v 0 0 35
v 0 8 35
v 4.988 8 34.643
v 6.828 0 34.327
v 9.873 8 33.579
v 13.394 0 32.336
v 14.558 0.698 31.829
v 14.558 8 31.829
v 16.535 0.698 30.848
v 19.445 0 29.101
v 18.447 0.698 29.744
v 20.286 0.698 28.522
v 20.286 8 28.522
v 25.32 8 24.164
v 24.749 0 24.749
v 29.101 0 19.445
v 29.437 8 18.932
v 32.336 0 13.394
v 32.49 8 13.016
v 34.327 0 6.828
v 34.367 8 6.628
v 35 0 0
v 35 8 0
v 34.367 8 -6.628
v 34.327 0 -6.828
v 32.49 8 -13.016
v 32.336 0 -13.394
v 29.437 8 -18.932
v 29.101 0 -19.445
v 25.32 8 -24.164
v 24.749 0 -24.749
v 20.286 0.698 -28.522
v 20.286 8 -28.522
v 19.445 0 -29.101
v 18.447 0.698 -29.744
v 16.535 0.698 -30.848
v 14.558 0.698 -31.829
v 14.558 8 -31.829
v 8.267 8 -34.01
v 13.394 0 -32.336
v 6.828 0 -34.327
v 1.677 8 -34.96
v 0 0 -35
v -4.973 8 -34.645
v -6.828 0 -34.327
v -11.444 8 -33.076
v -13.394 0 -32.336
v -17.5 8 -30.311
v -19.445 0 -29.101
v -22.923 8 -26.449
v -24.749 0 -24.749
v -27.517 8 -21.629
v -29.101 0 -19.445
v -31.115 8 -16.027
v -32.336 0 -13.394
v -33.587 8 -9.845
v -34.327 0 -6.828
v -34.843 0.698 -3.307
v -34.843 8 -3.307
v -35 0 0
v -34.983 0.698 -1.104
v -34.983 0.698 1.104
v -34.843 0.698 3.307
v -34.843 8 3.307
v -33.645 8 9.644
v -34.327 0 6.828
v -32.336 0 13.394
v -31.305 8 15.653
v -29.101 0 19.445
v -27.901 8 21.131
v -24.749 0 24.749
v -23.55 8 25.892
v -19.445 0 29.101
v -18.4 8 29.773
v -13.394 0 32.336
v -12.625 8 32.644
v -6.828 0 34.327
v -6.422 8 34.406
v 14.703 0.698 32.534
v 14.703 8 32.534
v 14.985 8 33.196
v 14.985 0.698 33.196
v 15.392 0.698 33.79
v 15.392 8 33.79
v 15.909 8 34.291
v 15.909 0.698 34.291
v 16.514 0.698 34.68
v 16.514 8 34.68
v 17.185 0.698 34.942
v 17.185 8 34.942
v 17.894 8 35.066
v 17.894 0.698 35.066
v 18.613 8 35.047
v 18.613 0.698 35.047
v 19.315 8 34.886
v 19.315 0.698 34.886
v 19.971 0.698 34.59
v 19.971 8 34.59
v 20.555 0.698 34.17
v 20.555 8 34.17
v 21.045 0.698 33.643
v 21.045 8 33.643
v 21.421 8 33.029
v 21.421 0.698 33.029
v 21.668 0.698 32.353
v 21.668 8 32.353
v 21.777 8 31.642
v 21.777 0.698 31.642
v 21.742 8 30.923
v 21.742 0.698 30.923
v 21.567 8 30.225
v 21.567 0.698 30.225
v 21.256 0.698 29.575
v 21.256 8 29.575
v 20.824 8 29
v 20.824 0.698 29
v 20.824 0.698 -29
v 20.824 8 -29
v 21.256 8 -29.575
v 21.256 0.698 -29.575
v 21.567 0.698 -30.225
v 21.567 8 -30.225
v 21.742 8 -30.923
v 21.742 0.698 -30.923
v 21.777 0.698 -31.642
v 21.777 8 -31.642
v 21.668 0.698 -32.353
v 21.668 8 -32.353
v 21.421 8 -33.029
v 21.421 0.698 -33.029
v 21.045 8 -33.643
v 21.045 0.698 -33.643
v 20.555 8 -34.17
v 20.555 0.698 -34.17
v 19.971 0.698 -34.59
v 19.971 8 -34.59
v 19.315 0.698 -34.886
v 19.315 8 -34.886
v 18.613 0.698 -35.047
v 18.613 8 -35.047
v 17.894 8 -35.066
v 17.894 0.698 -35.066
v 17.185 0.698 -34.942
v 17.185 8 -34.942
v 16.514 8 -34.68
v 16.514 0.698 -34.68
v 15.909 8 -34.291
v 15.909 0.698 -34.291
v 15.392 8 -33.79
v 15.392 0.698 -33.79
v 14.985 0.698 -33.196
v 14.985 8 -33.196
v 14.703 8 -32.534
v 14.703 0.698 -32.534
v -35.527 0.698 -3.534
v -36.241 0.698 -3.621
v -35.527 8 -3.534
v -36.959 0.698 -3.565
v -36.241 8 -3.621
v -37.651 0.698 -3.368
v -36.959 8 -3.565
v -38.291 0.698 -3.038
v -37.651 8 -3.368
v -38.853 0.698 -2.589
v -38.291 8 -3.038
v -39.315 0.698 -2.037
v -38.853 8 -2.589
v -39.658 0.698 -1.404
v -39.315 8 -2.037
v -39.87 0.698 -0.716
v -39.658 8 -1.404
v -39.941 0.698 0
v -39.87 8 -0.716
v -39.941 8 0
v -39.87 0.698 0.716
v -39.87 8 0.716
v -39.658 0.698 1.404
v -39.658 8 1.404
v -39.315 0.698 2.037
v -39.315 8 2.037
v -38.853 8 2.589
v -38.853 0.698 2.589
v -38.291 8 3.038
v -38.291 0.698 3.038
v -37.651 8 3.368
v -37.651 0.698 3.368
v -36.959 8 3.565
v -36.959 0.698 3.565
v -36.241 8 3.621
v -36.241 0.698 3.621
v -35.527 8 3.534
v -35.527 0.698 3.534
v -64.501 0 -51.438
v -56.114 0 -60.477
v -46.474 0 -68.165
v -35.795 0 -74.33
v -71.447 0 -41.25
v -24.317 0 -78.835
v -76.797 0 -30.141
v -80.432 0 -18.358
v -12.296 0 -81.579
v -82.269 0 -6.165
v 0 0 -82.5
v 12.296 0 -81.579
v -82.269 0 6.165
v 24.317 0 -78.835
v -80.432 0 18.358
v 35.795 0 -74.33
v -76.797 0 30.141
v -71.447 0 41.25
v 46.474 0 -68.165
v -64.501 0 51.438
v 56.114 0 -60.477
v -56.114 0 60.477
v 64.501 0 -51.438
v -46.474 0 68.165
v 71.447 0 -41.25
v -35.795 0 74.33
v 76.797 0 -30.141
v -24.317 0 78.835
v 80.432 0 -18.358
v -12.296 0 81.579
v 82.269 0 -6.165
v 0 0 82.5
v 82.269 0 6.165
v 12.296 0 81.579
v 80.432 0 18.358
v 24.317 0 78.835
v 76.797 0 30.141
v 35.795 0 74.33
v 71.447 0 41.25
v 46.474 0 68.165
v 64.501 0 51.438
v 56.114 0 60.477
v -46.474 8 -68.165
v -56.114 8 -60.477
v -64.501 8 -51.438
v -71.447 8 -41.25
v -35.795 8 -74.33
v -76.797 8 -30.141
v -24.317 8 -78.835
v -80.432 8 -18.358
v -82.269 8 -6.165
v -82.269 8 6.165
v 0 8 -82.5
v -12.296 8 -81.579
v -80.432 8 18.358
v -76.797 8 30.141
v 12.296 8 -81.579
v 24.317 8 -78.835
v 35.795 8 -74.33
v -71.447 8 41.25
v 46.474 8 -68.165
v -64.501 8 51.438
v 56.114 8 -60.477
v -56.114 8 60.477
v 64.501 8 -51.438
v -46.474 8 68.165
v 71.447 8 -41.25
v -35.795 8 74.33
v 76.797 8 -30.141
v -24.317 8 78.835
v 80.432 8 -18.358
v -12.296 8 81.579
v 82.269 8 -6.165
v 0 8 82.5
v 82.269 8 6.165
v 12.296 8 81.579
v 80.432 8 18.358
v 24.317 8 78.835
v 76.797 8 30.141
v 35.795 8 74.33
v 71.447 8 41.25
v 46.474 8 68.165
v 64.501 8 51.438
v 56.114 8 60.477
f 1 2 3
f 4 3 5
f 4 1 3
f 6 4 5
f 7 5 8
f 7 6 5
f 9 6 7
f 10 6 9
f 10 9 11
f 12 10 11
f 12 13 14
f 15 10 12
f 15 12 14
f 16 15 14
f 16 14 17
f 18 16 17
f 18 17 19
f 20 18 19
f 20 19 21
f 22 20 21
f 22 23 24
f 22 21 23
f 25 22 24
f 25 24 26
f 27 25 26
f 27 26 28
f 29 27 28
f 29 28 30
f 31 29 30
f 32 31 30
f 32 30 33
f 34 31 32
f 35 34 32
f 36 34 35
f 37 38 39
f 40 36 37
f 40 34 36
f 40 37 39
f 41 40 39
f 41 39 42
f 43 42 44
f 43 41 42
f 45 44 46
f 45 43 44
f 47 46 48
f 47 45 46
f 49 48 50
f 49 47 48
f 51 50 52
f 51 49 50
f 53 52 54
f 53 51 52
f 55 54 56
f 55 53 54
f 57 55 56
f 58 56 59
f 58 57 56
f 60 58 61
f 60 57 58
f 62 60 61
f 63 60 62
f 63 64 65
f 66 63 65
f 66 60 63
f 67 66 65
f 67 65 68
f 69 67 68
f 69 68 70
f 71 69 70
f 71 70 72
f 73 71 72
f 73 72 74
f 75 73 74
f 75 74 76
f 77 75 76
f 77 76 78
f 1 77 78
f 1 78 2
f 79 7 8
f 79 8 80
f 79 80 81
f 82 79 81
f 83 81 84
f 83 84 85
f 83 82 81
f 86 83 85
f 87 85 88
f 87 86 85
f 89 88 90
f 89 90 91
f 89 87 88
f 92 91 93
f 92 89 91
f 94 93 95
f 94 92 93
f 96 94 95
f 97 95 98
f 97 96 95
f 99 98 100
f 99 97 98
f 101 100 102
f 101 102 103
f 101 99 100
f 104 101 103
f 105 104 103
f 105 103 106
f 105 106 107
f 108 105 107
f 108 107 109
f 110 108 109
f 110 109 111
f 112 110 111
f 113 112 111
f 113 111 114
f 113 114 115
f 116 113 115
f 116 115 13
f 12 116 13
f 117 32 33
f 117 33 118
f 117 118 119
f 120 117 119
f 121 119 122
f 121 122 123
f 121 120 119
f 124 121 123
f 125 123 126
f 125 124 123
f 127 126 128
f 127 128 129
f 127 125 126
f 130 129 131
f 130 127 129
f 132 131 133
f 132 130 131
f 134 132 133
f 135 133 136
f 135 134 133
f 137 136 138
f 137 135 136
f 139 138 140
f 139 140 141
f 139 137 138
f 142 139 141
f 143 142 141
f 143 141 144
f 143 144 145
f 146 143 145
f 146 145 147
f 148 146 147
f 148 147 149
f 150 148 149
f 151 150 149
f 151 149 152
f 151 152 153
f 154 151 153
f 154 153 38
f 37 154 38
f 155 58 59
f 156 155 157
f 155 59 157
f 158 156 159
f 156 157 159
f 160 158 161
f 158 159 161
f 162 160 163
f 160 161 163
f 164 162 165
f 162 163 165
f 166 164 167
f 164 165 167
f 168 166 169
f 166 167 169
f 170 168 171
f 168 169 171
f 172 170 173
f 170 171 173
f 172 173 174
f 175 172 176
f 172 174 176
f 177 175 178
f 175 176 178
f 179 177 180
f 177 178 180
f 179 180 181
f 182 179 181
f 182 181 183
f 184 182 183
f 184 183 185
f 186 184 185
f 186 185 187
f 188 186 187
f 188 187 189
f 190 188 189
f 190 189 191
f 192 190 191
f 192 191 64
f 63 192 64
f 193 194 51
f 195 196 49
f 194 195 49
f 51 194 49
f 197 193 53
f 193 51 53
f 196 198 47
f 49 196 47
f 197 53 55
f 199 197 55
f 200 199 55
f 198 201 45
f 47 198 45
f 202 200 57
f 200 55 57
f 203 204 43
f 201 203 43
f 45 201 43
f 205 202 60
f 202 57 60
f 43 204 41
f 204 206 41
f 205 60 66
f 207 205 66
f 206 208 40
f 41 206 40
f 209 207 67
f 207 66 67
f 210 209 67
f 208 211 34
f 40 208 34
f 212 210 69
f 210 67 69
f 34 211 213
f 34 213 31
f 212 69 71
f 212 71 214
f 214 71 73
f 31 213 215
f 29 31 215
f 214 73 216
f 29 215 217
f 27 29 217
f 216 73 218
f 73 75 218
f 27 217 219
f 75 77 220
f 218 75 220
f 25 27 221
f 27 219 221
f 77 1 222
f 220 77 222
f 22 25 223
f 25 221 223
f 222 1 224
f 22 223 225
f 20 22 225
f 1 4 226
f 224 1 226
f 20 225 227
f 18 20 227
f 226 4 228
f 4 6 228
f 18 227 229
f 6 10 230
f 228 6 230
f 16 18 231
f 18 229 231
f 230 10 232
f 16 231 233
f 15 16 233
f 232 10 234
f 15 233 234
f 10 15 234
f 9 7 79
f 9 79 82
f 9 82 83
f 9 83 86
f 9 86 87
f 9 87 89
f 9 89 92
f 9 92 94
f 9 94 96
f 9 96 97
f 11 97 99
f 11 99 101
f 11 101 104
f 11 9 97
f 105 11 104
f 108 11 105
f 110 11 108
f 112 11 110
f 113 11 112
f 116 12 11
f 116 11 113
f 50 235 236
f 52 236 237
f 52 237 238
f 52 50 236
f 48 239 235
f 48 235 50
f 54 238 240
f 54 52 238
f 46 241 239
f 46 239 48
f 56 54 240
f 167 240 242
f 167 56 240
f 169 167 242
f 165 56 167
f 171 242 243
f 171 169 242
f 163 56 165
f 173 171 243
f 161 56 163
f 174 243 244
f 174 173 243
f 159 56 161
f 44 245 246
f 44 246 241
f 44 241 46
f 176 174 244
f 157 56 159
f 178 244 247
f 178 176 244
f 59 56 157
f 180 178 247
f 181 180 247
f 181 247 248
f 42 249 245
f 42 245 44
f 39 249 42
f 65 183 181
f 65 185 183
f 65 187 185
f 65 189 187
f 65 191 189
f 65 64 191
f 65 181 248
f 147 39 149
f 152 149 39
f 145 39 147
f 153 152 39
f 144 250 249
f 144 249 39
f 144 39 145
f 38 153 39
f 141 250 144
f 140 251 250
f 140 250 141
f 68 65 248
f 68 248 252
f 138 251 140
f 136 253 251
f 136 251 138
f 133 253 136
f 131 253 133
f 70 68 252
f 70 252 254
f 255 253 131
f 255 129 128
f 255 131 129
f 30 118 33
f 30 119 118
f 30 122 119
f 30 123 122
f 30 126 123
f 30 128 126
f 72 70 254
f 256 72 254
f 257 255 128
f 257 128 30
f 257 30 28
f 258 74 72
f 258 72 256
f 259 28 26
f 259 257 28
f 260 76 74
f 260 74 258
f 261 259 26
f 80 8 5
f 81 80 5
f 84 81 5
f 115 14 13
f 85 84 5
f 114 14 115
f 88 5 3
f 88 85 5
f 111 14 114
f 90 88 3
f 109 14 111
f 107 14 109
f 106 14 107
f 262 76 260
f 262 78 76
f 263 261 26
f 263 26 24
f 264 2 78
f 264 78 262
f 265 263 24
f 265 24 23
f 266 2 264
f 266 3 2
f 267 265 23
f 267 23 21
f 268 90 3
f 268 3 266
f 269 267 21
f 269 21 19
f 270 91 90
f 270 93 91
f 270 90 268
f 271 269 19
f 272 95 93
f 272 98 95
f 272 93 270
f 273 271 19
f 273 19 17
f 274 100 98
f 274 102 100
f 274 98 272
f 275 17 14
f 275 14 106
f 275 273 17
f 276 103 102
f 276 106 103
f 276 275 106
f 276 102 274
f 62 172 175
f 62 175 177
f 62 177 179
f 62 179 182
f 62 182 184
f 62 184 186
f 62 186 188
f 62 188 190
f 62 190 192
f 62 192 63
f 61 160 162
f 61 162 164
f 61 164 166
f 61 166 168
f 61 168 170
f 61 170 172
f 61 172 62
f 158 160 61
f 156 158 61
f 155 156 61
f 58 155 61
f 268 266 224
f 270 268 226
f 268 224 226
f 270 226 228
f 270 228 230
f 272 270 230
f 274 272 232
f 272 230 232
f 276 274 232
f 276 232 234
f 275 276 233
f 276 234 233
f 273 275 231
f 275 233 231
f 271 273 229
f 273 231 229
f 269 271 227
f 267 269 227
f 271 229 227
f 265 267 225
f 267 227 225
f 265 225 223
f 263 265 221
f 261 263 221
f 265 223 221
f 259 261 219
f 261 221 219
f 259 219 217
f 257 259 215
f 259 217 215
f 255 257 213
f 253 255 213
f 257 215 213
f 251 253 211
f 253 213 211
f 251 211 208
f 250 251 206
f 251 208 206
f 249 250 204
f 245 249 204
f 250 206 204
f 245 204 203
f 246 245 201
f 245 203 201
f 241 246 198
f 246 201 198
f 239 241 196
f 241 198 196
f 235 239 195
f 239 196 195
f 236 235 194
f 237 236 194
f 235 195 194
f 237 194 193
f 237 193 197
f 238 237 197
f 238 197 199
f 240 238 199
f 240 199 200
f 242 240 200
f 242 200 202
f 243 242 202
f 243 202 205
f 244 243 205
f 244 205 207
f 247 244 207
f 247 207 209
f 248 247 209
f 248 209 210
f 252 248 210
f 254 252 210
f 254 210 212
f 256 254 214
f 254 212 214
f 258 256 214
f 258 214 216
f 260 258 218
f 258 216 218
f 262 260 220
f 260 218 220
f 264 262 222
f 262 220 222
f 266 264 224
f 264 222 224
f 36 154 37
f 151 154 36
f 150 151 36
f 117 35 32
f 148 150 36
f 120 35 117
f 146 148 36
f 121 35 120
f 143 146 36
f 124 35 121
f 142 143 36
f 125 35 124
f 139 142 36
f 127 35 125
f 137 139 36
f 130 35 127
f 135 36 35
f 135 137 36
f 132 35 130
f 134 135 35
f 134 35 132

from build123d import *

# Parameters (mm, degrees)
SKETCH1_R           = 82.5
BOSS_EXTRUDE1_DEPTH = 8
SKETCH2_R           = 35
CUT_EXTRUDE1_DEPTH  = 117.946568996
SKETCH3_R           = 3.621742951
CUT_EXTRUDE2_DEPTH  = 7.301638906
CIRPATTERN1_COUNT   = 3


with BuildPart() as part:
    # Sketch1 → Boss-Extrude1 (new body)
    with BuildSketch(Plane(origin=(0, 0, 0), x_dir=(1, 0, 0), z_dir=(0, 1, 0))):
        Circle(SKETCH1_R)
    extrude(amount=BOSS_EXTRUDE1_DEPTH)

    # Sketch2 → Cut-Extrude1 (cut, through all)
    with BuildSketch(Plane(origin=(0, 0, 0), x_dir=(1, 0, 0), z_dir=(0, 1, 0))):
        Circle(SKETCH2_R)
    extrude(amount=CUT_EXTRUDE1_DEPTH, mode=Mode.SUBTRACT)

    # Sketch3 → Cut-Extrude2 (cut)
    with BuildSketch(Plane(origin=(0, 8, 0), x_dir=(1, 0, 0), z_dir=(0, 1, 0))):
        with Locations((-36.31964846, 0)):
            Circle(SKETCH3_R)
    cut_extrude2 = extrude(amount=-CUT_EXTRUDE2_DEPTH, mode=Mode.SUBTRACT)

    # CirPattern1: Cut-Extrude2 ×3 about axis
    cirpattern1_axis = Axis((0, 0, 0), (0, 1, 0))
    for i in range(1, CIRPATTERN1_COUNT):
        add(cut_extrude2.rotate(cirpattern1_axis, i * 360 / CIRPATTERN1_COUNT), mode=Mode.SUBTRACT)


solid = part.part
